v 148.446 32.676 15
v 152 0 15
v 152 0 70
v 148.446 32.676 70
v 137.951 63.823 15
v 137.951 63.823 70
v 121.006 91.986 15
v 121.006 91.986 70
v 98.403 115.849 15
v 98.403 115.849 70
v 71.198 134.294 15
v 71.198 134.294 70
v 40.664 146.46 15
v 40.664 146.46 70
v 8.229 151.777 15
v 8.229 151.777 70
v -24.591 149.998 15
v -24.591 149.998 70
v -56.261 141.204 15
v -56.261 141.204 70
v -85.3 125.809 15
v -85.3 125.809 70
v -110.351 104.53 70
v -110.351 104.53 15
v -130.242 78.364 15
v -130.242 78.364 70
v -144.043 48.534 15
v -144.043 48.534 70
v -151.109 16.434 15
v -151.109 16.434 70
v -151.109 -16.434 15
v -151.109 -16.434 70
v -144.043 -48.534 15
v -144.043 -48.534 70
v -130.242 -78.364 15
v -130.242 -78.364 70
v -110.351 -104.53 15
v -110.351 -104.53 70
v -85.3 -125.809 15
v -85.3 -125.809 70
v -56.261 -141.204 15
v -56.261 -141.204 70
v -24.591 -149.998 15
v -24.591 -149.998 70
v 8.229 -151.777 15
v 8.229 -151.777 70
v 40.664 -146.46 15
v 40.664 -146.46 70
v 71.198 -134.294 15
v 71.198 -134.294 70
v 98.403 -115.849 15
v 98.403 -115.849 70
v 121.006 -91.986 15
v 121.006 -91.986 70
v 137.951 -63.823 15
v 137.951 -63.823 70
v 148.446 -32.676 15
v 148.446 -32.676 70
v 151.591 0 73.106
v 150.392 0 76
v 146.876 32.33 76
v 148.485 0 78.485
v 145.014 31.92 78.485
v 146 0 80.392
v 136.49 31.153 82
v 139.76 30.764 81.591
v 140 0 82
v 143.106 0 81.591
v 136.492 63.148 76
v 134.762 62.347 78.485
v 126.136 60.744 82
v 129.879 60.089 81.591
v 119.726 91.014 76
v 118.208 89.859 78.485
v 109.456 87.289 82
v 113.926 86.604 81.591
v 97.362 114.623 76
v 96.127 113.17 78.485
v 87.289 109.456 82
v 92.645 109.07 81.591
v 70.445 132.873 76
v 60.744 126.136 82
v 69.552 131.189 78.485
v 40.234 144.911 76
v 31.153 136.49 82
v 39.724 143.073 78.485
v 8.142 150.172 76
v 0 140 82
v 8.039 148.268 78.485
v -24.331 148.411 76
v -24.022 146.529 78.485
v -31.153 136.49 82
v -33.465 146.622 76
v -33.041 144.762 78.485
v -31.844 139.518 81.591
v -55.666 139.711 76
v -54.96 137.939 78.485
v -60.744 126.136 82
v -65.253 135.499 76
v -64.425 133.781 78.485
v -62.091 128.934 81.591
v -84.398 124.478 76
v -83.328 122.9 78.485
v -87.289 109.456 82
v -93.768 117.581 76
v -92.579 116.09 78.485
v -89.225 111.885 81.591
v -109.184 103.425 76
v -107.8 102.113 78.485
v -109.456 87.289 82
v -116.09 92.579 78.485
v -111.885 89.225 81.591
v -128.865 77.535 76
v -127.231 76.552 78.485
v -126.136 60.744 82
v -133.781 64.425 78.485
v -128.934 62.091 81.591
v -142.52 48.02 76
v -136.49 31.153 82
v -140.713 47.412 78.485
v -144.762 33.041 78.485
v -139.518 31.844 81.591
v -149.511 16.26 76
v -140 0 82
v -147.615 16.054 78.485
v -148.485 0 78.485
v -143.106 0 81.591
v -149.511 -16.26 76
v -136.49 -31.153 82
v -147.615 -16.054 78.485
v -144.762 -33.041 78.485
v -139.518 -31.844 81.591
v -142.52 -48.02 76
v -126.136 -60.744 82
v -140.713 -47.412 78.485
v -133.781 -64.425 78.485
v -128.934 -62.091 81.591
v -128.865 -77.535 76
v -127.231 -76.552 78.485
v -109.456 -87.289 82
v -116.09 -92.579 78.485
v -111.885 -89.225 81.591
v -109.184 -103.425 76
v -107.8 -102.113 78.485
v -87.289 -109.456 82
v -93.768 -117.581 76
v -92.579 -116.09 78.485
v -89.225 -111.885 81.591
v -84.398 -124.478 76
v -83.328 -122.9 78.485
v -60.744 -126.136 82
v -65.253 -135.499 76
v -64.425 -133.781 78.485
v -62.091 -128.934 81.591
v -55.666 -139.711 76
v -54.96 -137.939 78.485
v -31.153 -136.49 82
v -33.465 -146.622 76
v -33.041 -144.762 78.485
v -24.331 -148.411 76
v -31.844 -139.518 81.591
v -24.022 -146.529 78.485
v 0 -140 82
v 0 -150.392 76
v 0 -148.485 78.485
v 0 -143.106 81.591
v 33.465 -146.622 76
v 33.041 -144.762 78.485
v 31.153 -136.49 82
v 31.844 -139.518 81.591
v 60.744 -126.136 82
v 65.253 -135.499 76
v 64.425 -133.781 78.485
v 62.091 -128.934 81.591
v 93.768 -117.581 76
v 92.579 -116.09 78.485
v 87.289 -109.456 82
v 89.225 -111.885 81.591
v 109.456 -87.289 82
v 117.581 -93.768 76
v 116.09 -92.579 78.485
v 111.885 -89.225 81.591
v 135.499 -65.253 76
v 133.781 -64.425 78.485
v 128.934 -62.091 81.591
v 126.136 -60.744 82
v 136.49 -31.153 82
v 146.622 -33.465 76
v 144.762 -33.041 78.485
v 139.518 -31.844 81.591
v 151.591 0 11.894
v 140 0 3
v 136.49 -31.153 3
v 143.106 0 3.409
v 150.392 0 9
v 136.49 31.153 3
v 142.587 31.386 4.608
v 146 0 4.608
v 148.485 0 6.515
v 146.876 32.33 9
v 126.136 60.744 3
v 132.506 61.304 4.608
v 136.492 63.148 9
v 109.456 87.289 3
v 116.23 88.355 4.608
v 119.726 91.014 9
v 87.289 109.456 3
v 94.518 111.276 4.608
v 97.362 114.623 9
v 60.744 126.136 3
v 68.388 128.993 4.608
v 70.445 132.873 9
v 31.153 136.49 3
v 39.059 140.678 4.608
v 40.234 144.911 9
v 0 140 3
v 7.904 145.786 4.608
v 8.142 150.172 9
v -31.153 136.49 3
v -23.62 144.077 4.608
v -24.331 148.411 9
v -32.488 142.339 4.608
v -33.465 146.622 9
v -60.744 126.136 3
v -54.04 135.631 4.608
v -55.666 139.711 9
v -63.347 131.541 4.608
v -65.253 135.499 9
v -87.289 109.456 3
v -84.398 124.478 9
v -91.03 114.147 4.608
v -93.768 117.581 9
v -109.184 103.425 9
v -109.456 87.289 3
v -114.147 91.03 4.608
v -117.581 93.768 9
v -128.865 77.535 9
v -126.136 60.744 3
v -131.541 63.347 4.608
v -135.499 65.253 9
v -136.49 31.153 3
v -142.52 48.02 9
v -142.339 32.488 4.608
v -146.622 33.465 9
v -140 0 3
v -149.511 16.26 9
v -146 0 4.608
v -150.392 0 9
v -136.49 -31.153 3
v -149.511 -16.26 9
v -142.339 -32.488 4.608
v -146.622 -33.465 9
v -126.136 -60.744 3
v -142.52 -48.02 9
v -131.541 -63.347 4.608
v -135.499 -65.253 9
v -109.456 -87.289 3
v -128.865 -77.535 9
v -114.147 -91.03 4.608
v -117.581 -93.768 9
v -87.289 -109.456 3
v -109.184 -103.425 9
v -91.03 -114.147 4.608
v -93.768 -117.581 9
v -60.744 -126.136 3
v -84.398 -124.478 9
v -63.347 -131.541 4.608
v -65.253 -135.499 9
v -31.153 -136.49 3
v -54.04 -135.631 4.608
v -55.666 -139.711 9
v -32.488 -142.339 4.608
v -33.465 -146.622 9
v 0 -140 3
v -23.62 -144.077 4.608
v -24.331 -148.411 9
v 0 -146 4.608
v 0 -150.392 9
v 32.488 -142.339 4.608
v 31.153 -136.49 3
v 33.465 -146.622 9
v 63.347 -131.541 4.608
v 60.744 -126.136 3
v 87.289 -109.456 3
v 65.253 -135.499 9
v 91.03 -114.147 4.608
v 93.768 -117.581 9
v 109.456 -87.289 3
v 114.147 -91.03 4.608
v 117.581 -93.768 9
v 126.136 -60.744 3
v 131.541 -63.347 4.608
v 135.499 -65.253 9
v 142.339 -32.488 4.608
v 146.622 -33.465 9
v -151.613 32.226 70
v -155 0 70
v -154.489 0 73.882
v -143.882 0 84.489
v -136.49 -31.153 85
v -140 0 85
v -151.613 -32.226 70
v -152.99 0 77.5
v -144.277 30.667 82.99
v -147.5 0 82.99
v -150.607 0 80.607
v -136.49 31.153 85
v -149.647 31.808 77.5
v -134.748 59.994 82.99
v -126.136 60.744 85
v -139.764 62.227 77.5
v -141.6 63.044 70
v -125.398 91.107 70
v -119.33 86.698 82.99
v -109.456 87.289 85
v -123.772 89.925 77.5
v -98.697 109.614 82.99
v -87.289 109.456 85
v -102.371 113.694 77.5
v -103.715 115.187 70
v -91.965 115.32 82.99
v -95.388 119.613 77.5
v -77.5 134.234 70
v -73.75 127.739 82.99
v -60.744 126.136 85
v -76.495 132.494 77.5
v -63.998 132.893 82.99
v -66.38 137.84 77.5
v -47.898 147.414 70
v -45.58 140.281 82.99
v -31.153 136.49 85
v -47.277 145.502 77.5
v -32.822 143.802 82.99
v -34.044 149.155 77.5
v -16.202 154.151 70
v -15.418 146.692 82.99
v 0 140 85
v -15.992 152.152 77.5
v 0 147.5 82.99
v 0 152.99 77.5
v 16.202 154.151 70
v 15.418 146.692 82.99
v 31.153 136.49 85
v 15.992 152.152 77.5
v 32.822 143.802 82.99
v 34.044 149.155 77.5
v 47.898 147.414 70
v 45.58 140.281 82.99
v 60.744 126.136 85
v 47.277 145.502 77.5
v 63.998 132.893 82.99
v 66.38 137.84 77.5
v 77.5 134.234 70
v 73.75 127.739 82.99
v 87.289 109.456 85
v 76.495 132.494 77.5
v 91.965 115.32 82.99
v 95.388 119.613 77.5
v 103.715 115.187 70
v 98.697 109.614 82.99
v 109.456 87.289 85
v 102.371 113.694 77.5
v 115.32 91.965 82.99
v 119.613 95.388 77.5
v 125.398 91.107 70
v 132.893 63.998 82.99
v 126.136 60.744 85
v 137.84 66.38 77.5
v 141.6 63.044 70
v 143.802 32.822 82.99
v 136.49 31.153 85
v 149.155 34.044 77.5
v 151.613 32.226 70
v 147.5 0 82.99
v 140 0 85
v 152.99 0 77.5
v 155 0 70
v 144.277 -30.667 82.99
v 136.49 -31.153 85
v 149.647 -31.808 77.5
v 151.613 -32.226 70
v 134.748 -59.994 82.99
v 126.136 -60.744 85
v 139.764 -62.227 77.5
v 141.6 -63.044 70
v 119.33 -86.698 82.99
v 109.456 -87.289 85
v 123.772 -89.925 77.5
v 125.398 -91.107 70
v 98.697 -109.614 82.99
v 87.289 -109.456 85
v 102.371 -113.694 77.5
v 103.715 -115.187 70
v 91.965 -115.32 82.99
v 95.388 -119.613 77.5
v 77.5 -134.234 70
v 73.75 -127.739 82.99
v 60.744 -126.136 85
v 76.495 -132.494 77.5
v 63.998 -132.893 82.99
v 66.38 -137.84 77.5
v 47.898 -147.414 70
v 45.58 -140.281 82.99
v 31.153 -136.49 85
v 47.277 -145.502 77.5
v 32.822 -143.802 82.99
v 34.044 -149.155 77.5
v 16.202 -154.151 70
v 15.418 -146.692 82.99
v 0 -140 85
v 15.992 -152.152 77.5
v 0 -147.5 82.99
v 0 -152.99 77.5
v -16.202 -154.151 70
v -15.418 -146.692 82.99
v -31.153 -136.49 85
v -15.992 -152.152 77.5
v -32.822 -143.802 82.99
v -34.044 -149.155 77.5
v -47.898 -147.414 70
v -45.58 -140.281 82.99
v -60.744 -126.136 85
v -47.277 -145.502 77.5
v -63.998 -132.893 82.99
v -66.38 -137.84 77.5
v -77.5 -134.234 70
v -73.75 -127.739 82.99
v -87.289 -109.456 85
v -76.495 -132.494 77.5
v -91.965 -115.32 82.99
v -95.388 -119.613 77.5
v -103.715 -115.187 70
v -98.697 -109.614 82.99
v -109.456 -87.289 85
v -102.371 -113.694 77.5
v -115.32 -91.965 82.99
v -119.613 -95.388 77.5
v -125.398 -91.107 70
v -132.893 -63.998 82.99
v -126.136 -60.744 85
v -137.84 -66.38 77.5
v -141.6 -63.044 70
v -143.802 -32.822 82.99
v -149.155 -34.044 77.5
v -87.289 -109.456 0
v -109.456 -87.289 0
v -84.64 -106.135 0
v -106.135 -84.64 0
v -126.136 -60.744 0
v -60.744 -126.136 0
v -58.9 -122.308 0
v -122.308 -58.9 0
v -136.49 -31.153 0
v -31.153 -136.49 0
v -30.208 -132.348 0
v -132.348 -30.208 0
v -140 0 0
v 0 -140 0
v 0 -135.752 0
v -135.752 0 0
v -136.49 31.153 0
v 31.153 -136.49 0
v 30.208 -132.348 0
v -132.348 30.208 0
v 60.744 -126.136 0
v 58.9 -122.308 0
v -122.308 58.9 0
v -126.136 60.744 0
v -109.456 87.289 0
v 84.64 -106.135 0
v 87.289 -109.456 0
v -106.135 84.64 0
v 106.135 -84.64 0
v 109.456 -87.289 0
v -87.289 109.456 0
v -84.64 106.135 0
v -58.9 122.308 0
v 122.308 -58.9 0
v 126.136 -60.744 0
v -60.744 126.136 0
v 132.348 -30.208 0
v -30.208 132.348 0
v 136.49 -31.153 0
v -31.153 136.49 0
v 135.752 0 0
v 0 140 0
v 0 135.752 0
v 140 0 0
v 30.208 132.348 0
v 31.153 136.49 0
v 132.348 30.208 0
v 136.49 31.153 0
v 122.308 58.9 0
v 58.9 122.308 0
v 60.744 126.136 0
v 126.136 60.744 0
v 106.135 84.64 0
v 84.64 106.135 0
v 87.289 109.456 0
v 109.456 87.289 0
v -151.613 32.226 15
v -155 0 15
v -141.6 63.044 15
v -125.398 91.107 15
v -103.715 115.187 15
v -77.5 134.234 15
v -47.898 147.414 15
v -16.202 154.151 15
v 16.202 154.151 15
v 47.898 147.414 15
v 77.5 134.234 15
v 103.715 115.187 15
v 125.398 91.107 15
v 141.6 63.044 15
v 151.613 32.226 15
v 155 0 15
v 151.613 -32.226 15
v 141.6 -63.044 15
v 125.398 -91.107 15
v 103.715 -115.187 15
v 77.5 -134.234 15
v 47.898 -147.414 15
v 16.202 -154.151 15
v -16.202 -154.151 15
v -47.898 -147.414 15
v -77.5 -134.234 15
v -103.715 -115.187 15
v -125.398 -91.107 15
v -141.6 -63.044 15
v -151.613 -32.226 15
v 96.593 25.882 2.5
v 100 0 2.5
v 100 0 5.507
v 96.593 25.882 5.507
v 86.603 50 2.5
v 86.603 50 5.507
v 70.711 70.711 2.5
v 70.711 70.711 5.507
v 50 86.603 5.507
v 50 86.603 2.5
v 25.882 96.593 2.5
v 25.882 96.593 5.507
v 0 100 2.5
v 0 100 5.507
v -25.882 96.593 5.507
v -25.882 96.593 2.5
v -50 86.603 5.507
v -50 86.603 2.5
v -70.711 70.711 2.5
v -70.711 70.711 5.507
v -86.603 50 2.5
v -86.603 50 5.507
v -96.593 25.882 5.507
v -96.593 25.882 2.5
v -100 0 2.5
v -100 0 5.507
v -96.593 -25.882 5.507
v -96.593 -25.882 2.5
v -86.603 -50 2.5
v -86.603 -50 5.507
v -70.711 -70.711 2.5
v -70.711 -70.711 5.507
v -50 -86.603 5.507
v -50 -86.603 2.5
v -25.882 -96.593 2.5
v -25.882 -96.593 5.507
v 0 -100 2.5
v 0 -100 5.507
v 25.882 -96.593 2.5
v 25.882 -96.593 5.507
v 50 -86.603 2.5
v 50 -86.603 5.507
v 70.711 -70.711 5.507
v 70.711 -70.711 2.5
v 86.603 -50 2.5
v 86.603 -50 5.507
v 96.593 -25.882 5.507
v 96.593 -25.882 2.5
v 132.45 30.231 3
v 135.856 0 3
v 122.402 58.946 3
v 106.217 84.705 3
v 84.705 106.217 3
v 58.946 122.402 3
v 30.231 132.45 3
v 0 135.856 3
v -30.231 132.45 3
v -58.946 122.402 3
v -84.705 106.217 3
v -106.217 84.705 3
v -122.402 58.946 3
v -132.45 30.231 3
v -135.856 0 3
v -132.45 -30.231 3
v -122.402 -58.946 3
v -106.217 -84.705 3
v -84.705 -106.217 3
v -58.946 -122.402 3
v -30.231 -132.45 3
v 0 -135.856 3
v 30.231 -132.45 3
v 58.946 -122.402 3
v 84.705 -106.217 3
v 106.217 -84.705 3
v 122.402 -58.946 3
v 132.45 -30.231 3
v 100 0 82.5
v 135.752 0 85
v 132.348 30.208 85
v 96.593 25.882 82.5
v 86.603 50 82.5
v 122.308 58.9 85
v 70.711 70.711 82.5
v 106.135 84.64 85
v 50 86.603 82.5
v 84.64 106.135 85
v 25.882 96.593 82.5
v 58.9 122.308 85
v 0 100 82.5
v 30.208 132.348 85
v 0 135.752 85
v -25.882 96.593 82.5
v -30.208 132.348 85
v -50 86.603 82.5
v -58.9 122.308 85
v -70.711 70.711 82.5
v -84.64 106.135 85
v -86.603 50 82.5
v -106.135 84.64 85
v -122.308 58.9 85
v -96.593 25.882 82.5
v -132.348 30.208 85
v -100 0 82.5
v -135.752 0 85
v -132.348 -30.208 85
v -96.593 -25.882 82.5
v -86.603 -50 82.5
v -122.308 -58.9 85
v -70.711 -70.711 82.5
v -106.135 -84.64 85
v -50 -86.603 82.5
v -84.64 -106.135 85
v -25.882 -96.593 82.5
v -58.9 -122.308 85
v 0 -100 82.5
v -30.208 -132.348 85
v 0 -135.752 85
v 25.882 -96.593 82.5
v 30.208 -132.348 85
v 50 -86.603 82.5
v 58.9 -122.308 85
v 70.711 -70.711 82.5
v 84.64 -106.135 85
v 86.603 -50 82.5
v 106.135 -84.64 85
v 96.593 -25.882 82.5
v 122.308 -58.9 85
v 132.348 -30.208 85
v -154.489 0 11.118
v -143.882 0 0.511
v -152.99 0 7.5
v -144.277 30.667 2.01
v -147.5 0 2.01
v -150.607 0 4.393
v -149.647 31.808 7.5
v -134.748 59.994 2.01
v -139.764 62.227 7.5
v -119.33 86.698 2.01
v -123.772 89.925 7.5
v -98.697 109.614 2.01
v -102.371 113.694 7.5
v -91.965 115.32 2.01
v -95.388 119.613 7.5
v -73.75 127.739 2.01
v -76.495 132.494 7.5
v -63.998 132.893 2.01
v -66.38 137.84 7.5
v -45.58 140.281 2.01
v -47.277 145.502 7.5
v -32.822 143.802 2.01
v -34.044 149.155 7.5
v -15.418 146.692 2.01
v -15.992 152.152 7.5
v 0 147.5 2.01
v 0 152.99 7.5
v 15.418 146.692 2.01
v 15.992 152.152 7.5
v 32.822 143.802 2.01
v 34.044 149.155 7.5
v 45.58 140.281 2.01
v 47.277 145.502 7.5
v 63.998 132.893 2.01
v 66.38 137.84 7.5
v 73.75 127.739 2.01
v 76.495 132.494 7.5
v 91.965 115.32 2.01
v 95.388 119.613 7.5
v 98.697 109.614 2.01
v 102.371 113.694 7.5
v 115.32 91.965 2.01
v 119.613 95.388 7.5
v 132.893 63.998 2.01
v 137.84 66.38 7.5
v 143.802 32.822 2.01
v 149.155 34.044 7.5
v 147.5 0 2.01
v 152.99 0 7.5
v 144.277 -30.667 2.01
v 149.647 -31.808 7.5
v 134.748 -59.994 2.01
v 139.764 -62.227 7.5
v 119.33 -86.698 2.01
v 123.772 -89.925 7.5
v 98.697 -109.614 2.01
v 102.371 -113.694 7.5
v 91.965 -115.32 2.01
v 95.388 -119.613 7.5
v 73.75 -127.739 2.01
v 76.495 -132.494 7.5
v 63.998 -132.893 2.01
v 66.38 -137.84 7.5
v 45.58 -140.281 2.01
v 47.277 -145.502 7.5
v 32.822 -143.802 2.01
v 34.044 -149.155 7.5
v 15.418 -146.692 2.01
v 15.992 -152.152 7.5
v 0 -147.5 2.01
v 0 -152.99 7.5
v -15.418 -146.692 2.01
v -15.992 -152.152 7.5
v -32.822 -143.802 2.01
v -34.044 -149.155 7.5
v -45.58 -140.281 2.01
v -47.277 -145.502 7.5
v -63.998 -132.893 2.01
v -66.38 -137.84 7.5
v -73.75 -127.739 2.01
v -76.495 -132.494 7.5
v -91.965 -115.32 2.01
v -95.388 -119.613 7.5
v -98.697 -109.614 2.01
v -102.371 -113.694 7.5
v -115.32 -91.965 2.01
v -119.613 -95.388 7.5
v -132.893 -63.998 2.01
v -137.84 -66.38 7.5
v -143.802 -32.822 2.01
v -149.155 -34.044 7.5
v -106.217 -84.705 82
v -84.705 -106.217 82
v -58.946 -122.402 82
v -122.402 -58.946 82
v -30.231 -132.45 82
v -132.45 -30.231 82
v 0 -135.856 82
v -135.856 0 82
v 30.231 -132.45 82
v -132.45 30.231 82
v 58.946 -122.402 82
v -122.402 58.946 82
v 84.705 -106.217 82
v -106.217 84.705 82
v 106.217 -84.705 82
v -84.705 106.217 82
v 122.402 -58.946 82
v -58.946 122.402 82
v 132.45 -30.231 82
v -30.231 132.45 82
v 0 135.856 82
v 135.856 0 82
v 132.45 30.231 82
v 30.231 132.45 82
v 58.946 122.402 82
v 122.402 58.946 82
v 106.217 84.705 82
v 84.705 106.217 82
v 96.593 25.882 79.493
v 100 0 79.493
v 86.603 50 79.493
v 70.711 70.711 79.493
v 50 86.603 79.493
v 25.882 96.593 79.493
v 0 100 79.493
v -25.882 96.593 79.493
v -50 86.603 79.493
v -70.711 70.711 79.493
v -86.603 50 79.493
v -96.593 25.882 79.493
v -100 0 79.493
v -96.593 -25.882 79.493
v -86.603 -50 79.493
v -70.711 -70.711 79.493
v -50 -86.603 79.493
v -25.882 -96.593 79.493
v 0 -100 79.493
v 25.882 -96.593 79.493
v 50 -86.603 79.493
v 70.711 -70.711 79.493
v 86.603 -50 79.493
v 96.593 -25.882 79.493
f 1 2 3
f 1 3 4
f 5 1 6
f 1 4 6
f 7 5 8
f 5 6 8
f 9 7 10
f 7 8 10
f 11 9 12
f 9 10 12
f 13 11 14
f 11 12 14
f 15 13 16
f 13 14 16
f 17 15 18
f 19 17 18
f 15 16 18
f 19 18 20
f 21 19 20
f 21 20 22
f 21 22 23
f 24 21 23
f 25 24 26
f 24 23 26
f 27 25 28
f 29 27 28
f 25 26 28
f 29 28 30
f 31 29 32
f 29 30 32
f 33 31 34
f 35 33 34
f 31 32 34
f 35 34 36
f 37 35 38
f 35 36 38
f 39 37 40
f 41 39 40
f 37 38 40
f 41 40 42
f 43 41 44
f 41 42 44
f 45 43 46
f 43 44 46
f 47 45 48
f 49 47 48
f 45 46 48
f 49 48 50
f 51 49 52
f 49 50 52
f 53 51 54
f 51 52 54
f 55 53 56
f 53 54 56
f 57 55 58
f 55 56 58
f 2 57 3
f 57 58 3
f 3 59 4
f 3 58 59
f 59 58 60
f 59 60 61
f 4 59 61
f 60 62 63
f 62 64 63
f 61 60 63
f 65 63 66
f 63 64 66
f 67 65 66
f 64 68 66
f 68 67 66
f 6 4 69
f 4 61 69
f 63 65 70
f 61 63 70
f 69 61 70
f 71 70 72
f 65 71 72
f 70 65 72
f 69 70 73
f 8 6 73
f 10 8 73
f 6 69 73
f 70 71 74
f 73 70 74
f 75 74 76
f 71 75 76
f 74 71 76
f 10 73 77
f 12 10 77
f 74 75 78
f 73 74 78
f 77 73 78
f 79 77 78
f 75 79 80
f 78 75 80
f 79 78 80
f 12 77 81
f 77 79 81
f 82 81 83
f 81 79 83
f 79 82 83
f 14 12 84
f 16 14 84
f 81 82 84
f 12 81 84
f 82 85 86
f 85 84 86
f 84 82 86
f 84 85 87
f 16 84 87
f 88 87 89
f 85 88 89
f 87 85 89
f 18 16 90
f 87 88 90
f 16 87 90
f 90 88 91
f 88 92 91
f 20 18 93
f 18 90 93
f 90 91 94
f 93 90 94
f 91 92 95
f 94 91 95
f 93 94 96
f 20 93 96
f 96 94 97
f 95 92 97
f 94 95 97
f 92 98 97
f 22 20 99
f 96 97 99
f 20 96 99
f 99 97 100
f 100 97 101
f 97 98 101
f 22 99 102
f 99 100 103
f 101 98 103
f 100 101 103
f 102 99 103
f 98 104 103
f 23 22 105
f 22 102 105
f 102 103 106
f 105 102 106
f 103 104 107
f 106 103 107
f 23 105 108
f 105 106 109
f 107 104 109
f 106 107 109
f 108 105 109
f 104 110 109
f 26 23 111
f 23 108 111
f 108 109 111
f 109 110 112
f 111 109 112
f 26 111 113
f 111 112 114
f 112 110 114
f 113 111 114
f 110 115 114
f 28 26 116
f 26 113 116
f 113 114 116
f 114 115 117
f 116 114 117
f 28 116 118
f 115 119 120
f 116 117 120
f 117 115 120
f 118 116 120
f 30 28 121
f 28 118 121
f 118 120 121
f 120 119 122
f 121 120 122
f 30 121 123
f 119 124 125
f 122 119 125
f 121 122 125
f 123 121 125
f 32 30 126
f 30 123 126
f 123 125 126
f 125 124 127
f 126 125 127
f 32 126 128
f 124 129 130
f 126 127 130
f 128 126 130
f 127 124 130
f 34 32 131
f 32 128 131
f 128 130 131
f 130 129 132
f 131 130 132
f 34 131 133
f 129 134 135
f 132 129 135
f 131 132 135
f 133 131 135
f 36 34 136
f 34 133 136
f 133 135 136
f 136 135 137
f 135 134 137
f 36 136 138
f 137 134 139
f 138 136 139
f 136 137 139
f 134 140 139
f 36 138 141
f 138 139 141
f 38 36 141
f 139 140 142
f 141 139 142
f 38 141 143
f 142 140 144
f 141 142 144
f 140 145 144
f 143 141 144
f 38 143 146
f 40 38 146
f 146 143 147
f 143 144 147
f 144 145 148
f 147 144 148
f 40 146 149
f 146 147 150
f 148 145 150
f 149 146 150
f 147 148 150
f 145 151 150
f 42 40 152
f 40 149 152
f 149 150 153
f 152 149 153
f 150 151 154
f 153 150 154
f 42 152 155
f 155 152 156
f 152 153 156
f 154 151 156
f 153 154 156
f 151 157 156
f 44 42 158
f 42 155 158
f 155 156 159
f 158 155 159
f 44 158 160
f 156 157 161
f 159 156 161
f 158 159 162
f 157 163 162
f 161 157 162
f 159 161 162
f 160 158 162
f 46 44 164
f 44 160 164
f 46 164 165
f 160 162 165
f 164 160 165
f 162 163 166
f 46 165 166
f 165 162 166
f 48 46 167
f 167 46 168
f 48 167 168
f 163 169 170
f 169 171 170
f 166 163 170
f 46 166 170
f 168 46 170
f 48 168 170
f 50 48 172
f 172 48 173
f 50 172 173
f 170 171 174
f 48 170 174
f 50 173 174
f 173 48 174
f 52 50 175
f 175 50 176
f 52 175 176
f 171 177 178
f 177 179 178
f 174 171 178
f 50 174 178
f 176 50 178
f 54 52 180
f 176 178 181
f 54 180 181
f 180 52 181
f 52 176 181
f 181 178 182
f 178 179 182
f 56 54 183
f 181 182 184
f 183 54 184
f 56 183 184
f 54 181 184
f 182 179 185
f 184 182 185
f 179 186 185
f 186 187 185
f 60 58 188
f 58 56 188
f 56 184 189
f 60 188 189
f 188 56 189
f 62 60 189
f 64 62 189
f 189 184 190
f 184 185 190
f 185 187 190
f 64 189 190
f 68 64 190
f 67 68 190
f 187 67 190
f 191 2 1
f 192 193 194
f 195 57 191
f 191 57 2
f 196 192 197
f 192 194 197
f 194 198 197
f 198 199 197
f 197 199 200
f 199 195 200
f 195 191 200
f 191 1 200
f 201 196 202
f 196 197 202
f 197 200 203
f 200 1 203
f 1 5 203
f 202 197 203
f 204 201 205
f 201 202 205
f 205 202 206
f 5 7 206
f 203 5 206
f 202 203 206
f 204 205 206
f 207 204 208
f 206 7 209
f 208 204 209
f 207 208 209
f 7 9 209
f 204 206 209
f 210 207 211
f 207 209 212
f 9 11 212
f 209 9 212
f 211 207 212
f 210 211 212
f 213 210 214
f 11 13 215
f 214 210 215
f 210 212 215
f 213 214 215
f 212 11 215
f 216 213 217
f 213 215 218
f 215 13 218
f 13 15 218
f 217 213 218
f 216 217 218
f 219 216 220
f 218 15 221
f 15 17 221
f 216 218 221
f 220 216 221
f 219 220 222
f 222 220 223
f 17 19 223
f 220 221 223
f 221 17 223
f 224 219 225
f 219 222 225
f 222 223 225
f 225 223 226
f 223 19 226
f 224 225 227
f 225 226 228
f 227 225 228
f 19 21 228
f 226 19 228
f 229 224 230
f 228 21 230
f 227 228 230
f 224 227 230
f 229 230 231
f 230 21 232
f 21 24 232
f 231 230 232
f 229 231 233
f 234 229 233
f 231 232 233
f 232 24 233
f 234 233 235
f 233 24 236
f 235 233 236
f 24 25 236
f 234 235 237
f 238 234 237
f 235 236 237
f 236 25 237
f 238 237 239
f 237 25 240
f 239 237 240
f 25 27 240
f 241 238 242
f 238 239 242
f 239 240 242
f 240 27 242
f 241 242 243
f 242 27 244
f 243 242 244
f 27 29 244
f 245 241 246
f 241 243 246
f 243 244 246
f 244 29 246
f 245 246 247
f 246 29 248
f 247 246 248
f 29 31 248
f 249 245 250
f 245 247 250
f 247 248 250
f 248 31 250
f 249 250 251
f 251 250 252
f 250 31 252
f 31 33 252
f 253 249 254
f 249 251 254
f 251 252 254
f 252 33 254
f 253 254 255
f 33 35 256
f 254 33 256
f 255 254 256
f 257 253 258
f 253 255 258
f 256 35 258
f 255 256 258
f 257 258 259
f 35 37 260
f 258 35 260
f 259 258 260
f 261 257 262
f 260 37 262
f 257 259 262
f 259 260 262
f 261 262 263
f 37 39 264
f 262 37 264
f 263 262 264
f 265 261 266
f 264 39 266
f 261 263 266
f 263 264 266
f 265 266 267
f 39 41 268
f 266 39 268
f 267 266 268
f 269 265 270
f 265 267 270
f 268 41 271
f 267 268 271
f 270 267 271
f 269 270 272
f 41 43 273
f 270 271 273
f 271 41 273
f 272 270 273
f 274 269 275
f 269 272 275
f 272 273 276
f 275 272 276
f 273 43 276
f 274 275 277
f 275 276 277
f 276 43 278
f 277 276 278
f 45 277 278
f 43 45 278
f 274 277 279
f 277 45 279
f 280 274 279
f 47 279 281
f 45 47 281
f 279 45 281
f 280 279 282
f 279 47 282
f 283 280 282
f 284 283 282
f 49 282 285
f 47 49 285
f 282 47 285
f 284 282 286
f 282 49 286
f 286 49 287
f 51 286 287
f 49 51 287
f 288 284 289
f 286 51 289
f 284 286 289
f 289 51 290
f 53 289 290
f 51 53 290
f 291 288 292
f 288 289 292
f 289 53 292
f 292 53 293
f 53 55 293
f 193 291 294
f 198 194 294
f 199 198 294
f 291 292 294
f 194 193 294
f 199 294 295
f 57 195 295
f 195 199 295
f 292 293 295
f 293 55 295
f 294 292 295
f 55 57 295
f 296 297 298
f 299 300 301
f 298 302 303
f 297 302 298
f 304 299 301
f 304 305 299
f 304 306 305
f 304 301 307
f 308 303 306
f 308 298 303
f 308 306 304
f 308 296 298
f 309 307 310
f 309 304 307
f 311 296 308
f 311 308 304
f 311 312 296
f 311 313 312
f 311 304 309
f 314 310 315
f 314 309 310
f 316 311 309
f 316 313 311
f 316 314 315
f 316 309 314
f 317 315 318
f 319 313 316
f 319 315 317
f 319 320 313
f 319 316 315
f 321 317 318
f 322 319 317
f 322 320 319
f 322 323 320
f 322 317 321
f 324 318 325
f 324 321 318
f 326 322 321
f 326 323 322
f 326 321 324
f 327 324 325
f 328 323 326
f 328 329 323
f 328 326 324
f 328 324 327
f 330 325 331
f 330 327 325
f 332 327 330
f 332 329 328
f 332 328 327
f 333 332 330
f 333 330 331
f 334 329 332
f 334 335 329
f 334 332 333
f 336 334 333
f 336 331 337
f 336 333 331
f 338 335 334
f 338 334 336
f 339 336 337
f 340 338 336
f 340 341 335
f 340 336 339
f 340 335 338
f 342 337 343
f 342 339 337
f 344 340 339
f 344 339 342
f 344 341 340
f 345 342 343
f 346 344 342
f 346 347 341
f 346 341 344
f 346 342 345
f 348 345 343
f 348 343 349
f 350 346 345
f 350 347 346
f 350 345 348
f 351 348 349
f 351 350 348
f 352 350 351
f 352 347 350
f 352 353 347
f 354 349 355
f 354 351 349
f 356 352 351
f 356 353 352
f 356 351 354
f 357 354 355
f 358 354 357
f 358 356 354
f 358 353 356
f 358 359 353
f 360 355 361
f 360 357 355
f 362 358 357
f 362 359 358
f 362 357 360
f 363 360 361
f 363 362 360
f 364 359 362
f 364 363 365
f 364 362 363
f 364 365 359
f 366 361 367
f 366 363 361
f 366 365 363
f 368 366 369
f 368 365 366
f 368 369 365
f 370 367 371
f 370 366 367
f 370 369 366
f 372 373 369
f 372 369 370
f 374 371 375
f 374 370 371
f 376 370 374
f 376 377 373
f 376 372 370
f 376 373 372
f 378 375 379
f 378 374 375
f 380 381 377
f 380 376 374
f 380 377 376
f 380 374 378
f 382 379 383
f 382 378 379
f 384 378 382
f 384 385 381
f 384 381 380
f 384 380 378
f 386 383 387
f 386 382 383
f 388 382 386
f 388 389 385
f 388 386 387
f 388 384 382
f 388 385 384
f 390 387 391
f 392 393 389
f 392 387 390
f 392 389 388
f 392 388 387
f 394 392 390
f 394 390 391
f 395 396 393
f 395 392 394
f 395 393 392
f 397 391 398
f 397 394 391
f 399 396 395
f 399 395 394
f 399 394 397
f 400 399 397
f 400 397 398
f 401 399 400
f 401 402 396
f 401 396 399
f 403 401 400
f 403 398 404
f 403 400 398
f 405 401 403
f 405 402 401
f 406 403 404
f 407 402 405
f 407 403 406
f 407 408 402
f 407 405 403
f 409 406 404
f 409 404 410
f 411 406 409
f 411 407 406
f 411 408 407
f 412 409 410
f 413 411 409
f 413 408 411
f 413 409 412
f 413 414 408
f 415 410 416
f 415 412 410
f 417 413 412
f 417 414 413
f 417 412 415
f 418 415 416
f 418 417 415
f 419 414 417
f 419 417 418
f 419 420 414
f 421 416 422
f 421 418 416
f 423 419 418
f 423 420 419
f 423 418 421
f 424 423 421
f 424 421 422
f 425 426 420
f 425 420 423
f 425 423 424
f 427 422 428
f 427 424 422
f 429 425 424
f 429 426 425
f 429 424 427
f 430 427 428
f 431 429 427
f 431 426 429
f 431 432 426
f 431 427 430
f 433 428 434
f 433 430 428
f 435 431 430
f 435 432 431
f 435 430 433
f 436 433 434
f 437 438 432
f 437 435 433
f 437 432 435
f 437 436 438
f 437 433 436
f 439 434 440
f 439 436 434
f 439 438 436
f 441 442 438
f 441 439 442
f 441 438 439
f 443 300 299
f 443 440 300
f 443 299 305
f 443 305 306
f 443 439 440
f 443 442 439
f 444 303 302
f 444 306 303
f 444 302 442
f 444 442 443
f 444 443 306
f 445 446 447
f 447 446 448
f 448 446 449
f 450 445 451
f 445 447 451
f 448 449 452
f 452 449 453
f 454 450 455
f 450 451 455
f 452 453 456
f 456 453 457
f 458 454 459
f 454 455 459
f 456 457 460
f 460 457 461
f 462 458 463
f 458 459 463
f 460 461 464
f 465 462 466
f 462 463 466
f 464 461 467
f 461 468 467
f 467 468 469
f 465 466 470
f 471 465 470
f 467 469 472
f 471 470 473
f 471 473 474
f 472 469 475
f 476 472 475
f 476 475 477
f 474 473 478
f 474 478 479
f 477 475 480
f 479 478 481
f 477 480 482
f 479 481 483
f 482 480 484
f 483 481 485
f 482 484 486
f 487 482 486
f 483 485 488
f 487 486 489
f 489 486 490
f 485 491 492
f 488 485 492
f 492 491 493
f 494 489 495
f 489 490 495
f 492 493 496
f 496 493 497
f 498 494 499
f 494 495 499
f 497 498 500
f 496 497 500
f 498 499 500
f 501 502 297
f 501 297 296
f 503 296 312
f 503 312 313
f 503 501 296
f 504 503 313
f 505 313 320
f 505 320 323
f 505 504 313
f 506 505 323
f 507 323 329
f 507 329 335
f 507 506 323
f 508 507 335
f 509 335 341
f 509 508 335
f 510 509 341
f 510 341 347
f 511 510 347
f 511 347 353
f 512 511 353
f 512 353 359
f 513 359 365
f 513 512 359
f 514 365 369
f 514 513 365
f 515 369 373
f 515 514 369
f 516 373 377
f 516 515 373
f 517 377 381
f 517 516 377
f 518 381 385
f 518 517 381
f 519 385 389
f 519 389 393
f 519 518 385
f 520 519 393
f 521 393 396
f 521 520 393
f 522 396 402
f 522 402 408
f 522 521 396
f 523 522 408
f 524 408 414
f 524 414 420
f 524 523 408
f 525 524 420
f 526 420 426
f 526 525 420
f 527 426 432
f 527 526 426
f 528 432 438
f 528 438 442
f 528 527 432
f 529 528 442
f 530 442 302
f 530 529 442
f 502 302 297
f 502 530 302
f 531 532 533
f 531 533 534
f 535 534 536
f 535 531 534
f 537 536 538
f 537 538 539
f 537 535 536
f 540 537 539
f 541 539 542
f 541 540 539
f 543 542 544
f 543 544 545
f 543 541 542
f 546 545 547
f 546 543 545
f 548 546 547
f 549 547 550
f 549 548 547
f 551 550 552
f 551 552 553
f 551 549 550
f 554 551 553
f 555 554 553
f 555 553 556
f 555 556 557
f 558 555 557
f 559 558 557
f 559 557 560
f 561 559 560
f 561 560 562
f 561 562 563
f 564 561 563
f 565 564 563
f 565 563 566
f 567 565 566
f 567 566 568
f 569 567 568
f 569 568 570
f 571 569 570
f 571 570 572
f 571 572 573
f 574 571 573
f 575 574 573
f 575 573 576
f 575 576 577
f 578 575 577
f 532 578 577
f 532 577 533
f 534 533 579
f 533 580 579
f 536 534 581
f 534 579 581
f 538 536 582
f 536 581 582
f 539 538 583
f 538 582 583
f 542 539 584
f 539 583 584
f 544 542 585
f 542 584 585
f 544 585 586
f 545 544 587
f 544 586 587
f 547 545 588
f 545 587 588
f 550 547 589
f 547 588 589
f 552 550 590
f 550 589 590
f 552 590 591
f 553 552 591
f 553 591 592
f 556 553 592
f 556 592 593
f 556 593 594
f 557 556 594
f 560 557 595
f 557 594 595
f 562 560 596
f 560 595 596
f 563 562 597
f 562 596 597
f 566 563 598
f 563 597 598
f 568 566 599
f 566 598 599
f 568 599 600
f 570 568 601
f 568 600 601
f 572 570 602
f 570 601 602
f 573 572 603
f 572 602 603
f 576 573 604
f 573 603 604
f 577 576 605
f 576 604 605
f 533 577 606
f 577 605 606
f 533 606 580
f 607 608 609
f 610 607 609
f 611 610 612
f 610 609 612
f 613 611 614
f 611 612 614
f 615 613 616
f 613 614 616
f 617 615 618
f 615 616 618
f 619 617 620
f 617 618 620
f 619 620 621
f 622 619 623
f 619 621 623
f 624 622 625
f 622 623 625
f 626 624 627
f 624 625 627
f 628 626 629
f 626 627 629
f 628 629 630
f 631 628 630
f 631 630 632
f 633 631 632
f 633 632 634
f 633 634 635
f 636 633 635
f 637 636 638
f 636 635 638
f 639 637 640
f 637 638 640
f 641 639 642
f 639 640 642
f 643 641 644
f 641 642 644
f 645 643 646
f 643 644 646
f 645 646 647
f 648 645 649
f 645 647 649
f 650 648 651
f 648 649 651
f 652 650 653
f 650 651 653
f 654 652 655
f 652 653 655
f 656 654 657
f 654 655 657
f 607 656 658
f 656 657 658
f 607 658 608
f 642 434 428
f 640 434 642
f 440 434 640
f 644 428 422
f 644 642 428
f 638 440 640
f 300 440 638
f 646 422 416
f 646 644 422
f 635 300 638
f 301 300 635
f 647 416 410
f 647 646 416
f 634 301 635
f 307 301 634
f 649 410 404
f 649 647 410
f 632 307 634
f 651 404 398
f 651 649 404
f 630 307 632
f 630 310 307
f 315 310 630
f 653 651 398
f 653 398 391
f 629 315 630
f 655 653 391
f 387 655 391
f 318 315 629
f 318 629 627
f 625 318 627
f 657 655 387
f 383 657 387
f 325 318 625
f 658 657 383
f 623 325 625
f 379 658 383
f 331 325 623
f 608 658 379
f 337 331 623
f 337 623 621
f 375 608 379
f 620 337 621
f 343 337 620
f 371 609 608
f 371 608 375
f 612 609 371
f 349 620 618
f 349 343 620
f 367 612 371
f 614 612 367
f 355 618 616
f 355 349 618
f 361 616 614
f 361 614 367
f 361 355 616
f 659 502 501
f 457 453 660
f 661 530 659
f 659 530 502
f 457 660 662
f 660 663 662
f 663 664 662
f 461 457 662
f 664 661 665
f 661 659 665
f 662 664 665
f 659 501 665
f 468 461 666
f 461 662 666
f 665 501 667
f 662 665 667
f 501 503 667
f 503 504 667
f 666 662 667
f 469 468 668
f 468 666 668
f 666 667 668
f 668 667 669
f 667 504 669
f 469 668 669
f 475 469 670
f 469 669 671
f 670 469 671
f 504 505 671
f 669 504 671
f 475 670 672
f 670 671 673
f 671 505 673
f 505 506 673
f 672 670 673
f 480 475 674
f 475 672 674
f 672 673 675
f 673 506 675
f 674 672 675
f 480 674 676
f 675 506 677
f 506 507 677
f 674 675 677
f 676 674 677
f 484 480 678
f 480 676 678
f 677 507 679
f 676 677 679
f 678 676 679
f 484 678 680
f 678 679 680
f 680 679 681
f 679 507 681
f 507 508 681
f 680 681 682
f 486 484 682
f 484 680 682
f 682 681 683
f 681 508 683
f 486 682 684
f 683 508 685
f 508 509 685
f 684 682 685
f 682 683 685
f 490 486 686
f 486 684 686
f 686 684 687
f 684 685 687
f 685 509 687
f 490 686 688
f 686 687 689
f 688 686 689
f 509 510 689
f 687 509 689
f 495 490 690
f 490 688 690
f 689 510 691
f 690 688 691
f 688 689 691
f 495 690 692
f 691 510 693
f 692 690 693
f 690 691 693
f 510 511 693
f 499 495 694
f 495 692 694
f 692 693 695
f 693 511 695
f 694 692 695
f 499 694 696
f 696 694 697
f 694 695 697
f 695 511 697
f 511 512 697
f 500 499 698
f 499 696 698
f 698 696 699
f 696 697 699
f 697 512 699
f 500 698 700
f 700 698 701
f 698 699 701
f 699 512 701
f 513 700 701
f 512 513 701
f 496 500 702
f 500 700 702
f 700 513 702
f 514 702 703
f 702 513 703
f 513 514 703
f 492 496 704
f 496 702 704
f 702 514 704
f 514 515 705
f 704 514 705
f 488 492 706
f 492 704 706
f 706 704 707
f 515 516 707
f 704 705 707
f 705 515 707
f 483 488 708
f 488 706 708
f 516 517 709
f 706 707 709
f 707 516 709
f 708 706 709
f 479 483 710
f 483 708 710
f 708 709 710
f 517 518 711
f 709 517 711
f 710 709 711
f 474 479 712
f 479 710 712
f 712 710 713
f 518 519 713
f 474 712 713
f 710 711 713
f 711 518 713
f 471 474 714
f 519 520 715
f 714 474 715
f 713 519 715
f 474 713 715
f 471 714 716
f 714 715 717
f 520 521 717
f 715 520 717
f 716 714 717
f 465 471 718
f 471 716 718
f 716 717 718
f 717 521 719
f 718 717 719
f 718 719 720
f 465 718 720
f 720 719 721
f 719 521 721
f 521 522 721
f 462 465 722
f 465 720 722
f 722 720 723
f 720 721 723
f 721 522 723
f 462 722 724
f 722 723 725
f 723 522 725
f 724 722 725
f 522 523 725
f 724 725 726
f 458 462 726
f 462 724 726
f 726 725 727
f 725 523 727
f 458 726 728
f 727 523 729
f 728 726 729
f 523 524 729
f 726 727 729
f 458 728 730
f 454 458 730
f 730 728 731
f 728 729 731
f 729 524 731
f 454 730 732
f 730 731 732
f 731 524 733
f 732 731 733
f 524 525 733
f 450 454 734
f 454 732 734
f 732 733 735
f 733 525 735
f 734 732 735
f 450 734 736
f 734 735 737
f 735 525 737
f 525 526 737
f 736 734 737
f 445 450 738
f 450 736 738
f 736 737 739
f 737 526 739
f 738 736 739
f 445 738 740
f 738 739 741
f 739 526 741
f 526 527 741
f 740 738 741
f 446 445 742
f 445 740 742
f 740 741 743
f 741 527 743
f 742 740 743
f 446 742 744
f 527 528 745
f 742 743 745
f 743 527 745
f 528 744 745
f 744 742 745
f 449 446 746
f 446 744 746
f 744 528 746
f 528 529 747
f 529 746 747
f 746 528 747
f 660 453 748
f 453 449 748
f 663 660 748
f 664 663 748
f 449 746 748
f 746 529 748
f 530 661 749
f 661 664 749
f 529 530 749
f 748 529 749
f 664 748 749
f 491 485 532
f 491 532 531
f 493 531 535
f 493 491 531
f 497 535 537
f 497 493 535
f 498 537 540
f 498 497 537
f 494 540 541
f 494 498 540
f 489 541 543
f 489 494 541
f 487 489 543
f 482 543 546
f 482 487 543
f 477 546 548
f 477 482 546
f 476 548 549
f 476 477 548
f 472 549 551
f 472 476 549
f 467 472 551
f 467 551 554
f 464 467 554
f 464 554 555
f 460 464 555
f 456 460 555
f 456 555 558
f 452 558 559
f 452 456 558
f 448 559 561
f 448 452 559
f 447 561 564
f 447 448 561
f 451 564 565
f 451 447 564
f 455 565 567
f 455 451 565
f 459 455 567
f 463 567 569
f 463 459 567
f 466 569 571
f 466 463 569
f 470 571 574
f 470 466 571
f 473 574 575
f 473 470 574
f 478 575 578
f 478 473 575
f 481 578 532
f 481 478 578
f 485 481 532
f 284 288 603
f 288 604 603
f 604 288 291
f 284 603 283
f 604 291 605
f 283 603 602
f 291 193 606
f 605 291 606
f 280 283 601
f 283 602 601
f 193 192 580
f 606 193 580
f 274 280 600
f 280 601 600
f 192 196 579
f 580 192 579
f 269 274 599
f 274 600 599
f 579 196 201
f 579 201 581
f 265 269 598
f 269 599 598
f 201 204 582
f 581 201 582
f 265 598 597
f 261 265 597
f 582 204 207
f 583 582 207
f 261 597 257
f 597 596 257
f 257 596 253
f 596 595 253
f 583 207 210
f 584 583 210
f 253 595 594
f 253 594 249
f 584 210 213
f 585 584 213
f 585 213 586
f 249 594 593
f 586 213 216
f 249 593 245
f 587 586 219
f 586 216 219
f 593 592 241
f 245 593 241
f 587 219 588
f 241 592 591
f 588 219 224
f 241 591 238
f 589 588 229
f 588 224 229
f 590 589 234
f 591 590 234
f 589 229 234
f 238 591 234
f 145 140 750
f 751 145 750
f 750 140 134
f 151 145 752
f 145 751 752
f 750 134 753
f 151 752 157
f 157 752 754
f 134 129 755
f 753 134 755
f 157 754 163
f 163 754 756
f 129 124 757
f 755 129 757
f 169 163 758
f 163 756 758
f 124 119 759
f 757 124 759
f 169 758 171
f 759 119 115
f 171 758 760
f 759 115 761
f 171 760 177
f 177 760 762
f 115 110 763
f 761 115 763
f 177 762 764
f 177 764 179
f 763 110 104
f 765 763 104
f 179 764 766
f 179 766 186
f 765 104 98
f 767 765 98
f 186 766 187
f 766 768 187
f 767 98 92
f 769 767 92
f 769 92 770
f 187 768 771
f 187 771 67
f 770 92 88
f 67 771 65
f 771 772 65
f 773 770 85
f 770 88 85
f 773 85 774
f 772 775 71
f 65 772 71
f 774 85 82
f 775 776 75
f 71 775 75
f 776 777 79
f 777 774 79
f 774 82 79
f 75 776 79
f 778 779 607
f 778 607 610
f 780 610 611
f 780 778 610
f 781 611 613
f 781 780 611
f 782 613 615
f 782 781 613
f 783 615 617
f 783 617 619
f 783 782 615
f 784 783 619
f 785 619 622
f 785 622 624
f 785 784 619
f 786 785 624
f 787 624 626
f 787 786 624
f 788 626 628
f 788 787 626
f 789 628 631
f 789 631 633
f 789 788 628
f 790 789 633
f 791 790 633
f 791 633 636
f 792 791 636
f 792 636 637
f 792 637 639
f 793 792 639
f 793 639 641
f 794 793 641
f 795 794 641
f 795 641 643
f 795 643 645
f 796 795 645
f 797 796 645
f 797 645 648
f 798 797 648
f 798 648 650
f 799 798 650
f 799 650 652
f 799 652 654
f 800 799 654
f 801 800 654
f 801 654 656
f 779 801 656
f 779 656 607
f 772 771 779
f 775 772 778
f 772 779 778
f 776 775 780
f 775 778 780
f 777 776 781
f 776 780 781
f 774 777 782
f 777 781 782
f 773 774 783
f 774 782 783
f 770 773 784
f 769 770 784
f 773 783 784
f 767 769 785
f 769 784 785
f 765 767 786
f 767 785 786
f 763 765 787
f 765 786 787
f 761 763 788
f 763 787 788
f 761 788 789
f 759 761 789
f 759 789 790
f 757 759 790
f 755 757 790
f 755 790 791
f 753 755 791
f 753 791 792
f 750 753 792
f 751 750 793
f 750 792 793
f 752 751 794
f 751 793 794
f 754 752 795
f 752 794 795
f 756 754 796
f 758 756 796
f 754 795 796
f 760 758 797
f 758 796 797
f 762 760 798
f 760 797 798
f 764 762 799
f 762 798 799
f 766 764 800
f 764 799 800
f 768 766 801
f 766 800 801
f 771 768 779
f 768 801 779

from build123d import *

# Parameters (mm, degrees)
SKETCH_1_R          = 175
SKETCH_1_R_2        = 100
EXTRUDE_1_DEPTH     = 85
CHAMFER_1_SIZE      = 2.5
CHAMFER_1_SIZE2     = 35.751665642
CHAMFER_2_SIZE      = 2.5
CHAMFER_2_SIZE2     = 35.751665642
FILLET_1_R          = 20
SKETCH_4_R          = 243.967557574
SKETCH_4_R_2        = 155
CUT_EXTRUDE_3_DEPTH = 156
FILLET_2_R          = 15


# Read off the part's stored shape, not the designer's step: 抽壳2
with BuildPart() as part:
    # 草图1 → 凸台-拉伸1 (new body)
    with BuildSketch(Plane.XY):
        Circle(SKETCH_1_R)
        Circle(SKETCH_1_R_2, mode=Mode.SUBTRACT)
    extrude(amount=EXTRUDE_1_DEPTH)

    # 倒角1
    chamfer_1_edges = [part.edges().sort_by_distance(p)[0] for p in [
        (-100, 0, 85),
    ]]
    chamfer_1_side = [part.faces().sort_by_distance(p)[0] for p in [
        (-100, 0, 42.5),
    ]]
    chamfer(chamfer_1_edges, length=CHAMFER_1_SIZE, length2=CHAMFER_1_SIZE2, reference=chamfer_1_side[0])

    # 倒角2
    chamfer_2_edges = [part.edges().sort_by_distance(p)[0] for p in [
        (-100, 0, 0),
    ]]
    chamfer_2_side = [part.faces().sort_by_distance(p)[0] for p in [
        (-100, 0, 41.25),
    ]]
    chamfer(chamfer_2_edges, length=CHAMFER_2_SIZE, length2=CHAMFER_2_SIZE2, reference=chamfer_2_side[0])

    # 圆角1
    fillet_1_edges = [part.edges().sort_by_distance(p)[0] for p in [
        (-175, 0, 0),
        (-175, 0, 85),
    ]]
    fillet(fillet_1_edges, radius=FILLET_1_R)

    # 草图4 → 切除-拉伸3 (cut)
    with BuildSketch(Plane(origin=(0, 0, 0), x_dir=(-1, 0, 0), z_dir=(0, 0, -1))):
        Circle(SKETCH_4_R)
        Circle(SKETCH_4_R_2, mode=Mode.SUBTRACT)
    extrude(amount=-CUT_EXTRUDE_3_DEPTH, mode=Mode.SUBTRACT)

    # 圆角2
    fillet_2_edges = [part.edges().sort_by_distance(p)[0] for p in [
        (155, 0, 85),
        (155, 0, 0),
    ]]
    fillet(fillet_2_edges, radius=FILLET_2_R)

    # 抽壳2 outline → 抽壳2 (revolve, cut)
    with BuildSketch(Plane.XZ):
        with BuildLine():
            Line((140, 82), (135.85642795, 82))
            Line((135.85642795, 82), (100, 79.492674306))
            Line((100, 79.492674306), (100, 5.507325694))
            Line((100, 5.507325694), (135.85642795, 3))
            Line((135.85642795, 3), (140, 3))
            ThreePointArc((140, 3), (148.485281374, 6.514718626), (152, 15))
            Line((152, 15), (152, 70))
            ThreePointArc((152, 70), (148.485281374, 78.485281374), (140, 82))
        make_face()
    revolve(axis=Axis((0, 0, 0), (0, 0, 1)), mode=Mode.SUBTRACT)


solid = part.part
